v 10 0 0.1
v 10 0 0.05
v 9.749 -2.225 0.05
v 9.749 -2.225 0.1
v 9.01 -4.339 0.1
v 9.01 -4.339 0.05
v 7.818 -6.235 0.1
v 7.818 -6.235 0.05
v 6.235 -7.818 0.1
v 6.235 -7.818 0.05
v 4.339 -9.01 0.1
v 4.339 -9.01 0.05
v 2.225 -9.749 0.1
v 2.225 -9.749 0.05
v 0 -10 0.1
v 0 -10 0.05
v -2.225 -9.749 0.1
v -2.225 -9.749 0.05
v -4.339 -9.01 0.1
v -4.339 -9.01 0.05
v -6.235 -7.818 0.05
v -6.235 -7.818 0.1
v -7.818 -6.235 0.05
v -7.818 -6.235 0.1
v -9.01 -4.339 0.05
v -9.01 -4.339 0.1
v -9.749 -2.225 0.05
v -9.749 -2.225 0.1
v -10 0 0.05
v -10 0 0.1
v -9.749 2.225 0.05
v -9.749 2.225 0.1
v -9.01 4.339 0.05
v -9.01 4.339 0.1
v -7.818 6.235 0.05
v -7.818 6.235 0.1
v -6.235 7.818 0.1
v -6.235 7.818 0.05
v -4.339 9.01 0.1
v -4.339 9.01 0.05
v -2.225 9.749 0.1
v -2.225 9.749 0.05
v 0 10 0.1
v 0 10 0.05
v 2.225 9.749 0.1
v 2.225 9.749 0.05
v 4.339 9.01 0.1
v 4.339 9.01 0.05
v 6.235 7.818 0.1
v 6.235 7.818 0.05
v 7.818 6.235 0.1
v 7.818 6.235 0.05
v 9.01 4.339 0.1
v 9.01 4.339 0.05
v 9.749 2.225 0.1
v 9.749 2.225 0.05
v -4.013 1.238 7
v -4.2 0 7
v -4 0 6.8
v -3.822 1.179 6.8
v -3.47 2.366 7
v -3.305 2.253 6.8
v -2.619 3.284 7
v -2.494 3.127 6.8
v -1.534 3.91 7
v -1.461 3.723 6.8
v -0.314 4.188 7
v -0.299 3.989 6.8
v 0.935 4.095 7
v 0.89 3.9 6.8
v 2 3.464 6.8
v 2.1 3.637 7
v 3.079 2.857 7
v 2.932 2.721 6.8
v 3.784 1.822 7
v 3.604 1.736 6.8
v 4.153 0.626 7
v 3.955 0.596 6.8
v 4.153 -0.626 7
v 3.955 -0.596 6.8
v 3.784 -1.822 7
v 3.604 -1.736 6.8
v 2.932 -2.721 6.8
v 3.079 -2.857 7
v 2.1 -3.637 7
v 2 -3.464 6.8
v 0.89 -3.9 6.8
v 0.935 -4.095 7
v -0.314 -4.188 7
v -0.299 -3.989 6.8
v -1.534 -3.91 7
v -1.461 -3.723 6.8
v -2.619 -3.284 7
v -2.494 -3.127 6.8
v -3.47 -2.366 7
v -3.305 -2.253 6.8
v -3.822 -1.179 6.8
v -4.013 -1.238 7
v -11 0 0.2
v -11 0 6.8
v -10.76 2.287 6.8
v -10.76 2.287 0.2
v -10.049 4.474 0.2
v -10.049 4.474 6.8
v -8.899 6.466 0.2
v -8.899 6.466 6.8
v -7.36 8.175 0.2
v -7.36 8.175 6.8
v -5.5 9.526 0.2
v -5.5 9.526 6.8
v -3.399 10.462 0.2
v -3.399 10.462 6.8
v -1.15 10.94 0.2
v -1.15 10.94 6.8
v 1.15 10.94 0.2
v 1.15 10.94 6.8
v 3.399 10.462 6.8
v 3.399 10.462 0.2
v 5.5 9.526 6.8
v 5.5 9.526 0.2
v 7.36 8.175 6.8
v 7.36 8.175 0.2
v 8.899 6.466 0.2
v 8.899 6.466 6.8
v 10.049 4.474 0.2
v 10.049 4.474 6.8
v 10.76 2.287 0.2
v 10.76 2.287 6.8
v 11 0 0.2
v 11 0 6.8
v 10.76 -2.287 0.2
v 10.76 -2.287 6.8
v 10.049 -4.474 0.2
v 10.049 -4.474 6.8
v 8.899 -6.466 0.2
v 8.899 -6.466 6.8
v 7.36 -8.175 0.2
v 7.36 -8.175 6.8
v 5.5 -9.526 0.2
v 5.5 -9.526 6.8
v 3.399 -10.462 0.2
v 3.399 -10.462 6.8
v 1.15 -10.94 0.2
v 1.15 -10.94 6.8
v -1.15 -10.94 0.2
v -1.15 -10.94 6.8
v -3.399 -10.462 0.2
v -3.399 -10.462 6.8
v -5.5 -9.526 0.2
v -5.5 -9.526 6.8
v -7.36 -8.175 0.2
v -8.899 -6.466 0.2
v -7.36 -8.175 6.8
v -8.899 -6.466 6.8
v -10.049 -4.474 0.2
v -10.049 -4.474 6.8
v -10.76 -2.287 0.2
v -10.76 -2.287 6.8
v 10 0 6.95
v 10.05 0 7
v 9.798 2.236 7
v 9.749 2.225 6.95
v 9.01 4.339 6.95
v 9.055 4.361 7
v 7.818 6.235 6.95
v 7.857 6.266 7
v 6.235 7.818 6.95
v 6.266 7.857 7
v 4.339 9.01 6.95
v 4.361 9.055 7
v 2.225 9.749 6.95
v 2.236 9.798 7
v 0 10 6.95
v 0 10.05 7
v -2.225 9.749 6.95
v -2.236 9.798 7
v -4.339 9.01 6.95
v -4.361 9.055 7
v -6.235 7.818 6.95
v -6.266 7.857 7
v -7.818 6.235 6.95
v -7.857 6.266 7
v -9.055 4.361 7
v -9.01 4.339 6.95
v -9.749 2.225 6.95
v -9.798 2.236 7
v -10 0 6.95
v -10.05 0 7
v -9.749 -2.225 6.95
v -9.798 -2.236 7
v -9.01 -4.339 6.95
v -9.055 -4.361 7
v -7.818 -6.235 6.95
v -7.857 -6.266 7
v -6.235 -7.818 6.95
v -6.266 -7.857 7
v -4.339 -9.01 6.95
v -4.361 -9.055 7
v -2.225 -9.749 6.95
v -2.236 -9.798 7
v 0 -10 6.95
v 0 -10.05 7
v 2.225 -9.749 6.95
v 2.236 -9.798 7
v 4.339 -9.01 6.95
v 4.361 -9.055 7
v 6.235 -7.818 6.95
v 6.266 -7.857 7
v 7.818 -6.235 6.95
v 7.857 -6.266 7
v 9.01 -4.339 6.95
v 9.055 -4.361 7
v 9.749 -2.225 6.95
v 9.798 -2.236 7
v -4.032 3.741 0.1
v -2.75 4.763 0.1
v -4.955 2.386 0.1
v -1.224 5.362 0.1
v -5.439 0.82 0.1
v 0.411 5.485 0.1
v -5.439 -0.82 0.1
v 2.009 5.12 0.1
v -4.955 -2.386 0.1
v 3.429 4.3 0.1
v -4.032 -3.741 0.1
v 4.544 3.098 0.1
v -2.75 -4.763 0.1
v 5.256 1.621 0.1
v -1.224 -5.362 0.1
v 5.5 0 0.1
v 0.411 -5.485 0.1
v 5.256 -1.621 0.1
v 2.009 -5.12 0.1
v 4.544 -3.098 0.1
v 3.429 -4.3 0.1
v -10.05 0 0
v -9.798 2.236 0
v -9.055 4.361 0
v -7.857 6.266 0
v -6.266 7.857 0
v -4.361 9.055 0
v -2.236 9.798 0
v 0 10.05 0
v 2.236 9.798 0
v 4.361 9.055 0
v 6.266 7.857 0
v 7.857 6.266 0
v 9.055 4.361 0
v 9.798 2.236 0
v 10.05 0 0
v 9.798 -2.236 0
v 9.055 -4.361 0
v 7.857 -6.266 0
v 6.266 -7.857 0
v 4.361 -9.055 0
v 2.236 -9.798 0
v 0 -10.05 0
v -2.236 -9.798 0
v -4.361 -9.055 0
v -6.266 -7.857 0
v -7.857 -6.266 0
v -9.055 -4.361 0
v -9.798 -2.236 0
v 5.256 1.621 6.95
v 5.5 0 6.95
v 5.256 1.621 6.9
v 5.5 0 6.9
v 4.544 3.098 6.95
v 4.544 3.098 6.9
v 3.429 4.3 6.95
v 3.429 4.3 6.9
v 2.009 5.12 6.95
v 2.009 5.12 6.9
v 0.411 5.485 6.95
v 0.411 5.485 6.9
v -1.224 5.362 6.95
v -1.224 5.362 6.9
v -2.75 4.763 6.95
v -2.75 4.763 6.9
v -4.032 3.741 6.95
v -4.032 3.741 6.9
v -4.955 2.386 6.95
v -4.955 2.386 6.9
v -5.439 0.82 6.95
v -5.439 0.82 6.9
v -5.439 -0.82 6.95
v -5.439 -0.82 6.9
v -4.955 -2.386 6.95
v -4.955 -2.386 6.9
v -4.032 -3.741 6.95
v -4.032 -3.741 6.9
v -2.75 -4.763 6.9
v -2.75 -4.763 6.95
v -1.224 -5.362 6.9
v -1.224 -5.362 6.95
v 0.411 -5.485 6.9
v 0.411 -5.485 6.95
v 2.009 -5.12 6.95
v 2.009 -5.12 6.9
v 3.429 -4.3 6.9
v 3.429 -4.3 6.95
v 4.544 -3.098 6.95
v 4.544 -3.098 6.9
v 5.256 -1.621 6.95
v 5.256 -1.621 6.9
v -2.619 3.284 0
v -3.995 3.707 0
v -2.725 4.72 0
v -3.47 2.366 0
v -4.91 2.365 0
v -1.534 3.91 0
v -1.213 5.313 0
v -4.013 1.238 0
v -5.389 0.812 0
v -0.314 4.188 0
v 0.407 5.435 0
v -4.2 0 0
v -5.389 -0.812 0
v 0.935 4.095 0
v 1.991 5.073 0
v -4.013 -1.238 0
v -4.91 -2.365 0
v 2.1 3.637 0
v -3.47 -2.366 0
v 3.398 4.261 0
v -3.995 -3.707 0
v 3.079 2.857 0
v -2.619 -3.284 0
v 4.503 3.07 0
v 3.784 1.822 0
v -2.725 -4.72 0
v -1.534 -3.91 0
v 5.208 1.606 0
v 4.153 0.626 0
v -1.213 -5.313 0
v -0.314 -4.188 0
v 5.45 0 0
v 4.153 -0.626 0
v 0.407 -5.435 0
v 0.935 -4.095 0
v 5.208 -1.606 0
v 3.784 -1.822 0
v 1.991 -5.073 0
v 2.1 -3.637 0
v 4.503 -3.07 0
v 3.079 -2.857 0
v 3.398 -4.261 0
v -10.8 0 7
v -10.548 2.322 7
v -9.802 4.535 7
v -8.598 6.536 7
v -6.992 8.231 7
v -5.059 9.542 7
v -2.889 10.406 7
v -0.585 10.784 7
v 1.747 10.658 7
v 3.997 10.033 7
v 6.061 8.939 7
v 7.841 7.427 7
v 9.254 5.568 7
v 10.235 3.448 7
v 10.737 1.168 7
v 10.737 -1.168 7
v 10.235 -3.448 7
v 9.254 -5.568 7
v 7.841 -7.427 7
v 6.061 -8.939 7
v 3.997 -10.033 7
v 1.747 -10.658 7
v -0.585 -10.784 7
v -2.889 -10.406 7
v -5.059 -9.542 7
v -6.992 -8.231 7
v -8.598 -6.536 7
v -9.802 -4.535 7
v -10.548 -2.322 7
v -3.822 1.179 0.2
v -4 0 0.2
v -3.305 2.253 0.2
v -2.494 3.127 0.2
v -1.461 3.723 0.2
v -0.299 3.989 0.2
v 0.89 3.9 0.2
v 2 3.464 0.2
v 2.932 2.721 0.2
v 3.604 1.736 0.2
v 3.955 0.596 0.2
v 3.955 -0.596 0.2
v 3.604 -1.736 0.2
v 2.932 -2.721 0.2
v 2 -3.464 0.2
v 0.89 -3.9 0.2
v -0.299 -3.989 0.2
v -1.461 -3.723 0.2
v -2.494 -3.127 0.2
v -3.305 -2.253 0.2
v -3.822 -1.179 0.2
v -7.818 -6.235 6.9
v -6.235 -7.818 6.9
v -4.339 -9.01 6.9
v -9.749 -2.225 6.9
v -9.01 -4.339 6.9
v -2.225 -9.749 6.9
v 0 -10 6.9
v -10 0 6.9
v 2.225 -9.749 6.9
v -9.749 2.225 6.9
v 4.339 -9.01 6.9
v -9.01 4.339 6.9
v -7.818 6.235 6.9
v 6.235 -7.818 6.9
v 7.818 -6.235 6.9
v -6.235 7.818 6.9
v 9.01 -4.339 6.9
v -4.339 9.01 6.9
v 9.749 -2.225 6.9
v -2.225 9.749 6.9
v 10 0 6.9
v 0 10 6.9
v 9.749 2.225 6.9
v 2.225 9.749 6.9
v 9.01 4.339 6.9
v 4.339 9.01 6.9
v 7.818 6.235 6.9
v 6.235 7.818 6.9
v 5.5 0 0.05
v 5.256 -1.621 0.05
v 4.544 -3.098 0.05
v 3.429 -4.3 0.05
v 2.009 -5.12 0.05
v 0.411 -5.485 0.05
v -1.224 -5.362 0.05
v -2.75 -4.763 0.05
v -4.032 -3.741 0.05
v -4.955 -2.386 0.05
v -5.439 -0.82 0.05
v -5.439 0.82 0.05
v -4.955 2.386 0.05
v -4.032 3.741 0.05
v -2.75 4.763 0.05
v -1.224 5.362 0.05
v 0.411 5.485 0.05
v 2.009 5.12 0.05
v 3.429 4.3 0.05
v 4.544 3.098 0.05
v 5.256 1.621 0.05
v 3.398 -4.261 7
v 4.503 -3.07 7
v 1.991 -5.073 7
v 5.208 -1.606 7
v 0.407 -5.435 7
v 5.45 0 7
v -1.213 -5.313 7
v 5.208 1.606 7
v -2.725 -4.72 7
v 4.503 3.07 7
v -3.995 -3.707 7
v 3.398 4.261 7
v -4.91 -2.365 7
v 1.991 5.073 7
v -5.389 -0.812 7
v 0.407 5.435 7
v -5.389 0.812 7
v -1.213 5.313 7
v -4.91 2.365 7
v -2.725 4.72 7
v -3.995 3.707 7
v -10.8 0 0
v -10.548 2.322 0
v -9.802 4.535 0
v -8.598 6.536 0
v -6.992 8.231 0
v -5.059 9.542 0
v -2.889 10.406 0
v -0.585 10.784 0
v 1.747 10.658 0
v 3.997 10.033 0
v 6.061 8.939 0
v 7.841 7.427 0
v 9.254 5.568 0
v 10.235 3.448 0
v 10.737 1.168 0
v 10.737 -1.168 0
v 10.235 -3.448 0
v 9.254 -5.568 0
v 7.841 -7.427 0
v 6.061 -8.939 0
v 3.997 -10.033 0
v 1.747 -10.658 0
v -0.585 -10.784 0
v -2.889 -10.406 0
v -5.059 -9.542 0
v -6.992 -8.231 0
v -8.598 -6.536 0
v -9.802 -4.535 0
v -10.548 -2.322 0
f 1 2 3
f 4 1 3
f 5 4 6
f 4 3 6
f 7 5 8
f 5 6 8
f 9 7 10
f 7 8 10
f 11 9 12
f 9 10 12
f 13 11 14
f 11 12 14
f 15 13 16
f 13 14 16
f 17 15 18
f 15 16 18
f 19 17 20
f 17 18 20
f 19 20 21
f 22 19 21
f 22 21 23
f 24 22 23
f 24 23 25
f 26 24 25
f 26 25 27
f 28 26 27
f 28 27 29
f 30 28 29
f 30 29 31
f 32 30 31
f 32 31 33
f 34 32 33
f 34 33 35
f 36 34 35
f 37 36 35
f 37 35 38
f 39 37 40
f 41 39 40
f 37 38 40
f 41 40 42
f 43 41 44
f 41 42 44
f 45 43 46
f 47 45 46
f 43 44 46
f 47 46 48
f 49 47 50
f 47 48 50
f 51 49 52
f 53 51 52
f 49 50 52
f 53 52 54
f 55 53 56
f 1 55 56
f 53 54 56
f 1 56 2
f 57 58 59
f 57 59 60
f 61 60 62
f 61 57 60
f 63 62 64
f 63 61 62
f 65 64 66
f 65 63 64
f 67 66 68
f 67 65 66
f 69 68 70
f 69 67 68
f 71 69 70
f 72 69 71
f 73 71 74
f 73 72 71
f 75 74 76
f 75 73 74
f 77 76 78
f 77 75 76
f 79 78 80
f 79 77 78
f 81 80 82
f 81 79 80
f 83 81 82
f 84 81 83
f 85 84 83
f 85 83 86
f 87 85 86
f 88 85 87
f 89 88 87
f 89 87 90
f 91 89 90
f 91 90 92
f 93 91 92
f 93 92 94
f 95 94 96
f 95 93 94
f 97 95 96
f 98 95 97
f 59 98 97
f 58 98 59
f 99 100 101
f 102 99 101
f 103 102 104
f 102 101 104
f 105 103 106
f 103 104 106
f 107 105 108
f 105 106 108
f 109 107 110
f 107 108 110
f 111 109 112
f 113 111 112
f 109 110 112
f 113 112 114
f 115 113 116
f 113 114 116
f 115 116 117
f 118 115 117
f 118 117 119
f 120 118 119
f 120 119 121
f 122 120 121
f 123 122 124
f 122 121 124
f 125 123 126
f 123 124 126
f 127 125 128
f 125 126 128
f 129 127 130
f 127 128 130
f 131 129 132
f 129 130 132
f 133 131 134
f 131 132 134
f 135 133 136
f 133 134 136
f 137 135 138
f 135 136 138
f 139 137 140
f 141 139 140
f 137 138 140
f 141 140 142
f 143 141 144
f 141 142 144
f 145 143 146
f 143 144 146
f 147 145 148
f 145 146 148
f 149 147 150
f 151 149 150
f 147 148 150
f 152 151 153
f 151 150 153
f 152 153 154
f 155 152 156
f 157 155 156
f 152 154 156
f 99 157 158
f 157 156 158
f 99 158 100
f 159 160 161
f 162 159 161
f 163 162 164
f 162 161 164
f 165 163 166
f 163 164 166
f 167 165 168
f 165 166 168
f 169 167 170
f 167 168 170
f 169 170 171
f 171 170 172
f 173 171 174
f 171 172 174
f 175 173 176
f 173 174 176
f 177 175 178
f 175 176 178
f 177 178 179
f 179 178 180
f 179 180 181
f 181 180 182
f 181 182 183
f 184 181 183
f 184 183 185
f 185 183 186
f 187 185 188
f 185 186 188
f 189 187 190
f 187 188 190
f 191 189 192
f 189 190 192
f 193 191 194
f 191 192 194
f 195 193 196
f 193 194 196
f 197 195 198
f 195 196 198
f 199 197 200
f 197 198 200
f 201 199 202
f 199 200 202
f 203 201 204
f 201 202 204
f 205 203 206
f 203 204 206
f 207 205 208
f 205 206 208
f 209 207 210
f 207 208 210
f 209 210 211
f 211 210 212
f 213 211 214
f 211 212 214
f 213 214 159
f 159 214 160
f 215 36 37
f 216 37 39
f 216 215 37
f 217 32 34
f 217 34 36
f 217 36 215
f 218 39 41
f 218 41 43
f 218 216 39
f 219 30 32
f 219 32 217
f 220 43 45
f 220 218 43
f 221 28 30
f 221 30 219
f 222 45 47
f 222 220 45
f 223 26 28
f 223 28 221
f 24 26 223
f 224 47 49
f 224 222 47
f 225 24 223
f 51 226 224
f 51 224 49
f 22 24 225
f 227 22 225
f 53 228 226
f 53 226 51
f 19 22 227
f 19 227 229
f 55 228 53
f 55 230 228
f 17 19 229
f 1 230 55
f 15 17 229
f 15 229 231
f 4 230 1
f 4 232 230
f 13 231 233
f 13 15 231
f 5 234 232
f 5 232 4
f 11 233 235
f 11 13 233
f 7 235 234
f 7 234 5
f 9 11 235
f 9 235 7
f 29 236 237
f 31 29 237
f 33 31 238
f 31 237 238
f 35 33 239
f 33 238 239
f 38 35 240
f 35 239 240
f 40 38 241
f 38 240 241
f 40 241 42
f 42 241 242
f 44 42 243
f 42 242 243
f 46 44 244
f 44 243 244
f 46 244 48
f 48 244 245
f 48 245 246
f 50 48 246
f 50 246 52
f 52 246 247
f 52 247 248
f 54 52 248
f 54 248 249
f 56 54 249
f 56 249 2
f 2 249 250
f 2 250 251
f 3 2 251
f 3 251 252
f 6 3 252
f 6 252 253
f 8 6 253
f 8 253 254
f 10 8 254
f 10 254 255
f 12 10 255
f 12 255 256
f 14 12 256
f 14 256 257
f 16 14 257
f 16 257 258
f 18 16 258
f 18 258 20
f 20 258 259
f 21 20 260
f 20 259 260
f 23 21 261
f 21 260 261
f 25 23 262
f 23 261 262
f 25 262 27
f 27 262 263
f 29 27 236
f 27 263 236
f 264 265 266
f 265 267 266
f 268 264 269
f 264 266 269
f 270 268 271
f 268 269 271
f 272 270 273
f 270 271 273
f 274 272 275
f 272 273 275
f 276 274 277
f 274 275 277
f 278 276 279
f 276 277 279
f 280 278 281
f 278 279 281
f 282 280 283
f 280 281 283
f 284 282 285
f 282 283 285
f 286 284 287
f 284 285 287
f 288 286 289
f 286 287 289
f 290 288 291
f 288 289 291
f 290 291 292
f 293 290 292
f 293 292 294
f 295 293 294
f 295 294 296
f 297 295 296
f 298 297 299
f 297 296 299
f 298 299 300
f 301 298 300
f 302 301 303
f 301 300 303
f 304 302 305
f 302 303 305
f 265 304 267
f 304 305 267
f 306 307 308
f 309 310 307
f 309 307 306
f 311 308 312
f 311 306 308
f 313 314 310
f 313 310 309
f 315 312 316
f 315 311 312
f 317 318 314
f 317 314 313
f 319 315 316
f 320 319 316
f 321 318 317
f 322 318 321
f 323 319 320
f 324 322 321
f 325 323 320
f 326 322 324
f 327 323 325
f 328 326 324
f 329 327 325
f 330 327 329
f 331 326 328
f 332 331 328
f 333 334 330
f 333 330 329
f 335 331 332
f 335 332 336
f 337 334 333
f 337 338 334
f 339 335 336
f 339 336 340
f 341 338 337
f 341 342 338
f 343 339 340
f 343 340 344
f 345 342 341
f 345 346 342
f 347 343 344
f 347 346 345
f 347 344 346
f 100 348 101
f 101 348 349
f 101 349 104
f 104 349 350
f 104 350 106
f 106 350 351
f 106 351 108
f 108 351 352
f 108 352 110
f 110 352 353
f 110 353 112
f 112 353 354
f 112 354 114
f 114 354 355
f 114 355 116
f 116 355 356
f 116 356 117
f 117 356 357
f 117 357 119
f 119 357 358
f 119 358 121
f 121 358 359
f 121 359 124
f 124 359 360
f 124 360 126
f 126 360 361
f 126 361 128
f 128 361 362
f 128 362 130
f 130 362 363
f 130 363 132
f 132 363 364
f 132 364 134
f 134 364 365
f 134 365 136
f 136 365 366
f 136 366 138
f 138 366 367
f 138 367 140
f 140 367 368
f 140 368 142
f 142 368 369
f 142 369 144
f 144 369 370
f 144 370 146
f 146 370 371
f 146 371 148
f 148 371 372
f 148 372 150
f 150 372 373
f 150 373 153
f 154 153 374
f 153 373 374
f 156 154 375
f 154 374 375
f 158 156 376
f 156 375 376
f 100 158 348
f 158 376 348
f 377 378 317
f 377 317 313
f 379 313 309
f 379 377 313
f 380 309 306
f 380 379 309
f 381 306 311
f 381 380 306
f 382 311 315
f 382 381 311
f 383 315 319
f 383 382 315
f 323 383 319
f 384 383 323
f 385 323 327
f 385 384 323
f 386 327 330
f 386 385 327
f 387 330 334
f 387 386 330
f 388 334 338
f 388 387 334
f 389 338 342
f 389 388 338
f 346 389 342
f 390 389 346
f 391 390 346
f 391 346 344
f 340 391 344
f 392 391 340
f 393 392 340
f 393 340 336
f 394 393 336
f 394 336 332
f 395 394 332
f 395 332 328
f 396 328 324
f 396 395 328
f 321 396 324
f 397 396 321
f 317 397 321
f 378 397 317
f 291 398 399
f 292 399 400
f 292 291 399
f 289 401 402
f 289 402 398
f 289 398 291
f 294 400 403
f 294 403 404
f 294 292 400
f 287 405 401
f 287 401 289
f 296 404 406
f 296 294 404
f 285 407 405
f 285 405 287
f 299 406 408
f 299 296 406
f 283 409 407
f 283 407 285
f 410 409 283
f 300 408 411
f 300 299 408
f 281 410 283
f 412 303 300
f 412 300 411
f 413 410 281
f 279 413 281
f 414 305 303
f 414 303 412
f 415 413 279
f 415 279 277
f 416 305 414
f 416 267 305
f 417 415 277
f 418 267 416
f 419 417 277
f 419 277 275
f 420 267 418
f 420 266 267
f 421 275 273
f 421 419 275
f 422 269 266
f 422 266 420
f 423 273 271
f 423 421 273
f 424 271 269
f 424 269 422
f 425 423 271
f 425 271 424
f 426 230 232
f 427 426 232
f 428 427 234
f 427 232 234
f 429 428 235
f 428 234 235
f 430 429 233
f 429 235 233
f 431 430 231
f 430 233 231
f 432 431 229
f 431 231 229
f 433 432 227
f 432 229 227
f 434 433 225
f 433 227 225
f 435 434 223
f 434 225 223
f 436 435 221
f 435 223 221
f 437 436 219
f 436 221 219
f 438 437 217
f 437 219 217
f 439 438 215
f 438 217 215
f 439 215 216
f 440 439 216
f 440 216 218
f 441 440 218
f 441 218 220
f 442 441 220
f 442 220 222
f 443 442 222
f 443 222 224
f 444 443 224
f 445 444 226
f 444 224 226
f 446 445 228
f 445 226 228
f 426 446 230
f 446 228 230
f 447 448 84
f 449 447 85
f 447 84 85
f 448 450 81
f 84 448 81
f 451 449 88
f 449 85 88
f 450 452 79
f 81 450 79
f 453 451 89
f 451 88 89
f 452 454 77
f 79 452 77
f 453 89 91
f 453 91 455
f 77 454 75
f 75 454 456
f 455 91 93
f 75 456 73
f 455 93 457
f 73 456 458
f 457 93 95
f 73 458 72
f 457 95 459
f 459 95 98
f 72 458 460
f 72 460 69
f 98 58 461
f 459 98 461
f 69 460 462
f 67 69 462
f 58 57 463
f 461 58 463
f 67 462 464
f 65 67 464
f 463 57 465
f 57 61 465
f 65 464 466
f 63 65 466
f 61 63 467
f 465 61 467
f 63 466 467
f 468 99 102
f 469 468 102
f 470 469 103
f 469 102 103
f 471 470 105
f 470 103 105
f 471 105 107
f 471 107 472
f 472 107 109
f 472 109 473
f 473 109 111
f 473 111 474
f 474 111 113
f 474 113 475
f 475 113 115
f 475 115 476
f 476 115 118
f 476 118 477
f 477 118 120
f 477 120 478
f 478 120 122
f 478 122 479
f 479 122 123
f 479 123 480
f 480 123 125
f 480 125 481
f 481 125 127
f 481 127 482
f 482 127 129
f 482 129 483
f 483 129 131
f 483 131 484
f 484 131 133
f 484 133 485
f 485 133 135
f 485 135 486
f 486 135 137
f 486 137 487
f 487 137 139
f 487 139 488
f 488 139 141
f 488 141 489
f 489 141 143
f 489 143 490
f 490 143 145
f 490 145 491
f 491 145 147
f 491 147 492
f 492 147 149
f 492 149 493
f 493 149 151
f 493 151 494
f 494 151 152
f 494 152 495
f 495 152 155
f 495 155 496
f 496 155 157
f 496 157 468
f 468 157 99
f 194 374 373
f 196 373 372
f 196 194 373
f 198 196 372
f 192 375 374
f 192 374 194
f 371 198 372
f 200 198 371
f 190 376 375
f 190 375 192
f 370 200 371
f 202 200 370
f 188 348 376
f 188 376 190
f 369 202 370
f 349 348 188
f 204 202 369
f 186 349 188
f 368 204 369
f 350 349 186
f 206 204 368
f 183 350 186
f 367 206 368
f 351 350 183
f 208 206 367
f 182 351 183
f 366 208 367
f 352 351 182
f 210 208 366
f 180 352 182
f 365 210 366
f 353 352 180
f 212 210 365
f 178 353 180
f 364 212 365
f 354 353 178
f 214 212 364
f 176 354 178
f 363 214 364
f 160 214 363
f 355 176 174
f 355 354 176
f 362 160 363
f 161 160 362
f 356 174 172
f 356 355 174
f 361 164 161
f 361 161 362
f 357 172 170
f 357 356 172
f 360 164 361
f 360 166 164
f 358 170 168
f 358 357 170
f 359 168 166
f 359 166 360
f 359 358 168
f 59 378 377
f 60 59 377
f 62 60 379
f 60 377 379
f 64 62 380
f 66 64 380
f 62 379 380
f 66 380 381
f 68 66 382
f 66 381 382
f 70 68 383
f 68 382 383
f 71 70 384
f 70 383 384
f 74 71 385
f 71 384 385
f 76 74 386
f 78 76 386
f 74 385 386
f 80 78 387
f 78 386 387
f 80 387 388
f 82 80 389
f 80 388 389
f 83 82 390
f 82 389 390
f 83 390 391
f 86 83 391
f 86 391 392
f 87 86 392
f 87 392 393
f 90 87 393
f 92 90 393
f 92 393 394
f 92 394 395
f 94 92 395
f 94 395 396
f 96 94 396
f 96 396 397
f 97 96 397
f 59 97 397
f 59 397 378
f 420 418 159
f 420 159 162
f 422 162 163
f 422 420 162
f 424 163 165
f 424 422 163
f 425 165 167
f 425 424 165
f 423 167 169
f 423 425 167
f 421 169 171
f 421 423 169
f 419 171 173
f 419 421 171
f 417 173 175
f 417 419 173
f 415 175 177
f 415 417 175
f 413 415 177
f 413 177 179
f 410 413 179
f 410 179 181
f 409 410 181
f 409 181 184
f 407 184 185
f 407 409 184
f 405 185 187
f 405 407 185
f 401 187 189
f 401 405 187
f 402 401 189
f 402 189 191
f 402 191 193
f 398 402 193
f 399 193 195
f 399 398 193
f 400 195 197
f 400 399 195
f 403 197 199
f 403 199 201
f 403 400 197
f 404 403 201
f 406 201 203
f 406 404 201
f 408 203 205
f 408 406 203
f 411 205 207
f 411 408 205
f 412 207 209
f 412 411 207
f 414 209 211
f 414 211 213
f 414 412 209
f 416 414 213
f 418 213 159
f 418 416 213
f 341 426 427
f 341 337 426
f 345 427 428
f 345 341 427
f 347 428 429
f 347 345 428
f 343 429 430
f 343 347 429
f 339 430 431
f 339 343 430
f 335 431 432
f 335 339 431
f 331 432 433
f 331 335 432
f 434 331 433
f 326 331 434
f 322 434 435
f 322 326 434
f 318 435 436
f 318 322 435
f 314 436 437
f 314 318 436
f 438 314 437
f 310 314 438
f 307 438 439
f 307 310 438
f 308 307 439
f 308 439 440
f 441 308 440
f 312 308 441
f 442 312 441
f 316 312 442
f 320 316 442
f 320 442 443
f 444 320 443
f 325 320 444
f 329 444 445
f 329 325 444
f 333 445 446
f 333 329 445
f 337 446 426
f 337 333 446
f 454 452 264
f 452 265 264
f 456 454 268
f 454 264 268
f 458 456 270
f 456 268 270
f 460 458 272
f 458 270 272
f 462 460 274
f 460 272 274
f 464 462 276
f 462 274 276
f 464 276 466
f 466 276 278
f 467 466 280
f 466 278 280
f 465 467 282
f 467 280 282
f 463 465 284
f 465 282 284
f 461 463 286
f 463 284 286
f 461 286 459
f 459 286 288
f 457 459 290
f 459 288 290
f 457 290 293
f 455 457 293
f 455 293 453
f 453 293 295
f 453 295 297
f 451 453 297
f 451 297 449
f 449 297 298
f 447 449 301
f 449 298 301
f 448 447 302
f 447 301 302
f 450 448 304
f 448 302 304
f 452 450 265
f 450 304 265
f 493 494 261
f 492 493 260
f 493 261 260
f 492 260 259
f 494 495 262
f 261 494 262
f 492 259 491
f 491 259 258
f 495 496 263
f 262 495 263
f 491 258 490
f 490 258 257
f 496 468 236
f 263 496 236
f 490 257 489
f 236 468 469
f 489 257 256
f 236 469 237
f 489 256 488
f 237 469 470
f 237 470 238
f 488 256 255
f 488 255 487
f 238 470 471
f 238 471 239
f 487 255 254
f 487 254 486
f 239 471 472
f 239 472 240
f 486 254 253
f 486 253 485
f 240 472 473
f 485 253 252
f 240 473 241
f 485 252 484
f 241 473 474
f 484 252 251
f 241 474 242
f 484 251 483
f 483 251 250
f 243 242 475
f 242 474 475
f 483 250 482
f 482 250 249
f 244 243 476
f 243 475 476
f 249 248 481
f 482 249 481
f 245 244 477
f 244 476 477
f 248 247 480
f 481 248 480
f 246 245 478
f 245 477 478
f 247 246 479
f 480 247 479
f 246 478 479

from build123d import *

# Parameters (mm, degrees)
SKETCH1_W                = 11
SKETCH1_H                = 7
SKETCH2_R                = 10.05
CUT_EXTRUDE1_DEPTH       = 0.05
CUT_EXTRUDE1_DRAFT       = -45
SKETCH3_R                = 10
CUT_EXTRUDE2_DEPTH       = 0.05
SKETCH4_R                = 5.5
BOSS_EXTRUDE1_DEPTH      = 0.05
SKETCH5_R                = 5.5
BOSS_EXTRUDE2_DEPTH      = 0.05
BOSS_EXTRUDE2_TAPER      = 45
SKETCH6_R                = 10.05
CUT_EXTRUDE3_DEPTH       = 0.05
CUT_EXTRUDE3_DRAFT       = -45
CUT_EXTRUDE4_START       = -0.05
SKETCH7_R                = 10
CUT_EXTRUDE4_DEPTH       = 0.05
F_8_0_8_DIAMETER_HOLE1_D = 8
CHAMFER1_SIZE            = 0.2


with BuildPart() as part:
    # Sketch1 → Revolve1 (revolve)
    with BuildSketch(Plane.XZ, mode=Mode.PRIVATE) as revolve1_sk:
        with Locations((5.5, 3.5)):
            Rectangle(SKETCH1_W, SKETCH1_H)
    revolve(revolve1_sk.sketch.rotate(Axis((0, 0, 7), (0, 0, -1)), 180), axis=Axis((0, 0, 7), (0, 0, -1)))


with BuildPart() as cut_extrude1_tool:
    # Sketch2 → Cut-Extrude1 (with draft: the straight prism first)
    with BuildSketch(Plane(origin=(0, 0, 0), x_dir=(-1, 0, 0), z_dir=(0, 0, -1))):
        Circle(SKETCH2_R)
    extrude(amount=-CUT_EXTRUDE1_DEPTH)
    # Cut-Extrude1: the draft: its side faces are tilted about the plane it starts from
    cut_extrude1_sides = [cut_extrude1_tool.faces().sort_by_distance(p)[0] for p in [
        (10.05, 0, 0.025),
    ]]
    draft(cut_extrude1_sides, Plane(origin=(0, 0, 0), x_dir=(-1, 0, 0), z_dir=(0, 0, -1)), CUT_EXTRUDE1_DRAFT)


with BuildPart() as part_1:
    add(part.part)

    # Cut-Extrude1: cut by cut_extrude1_tool
    add(cut_extrude1_tool.part, mode=Mode.SUBTRACT)

    # Sketch3 → Cut-Extrude2 (cut)
    with BuildSketch(Plane(origin=(0, 0, 0.05), x_dir=(-1, 0, 0), z_dir=(0, 0, -1))):
        with Locations(Location((0, 0, 0), (0, 0, 180))):
            Circle(SKETCH3_R)
    extrude(amount=-CUT_EXTRUDE2_DEPTH, mode=Mode.SUBTRACT)

    # Sketch4 → Boss-Extrude1 (add)
    with BuildSketch(Plane(origin=(0, 0, 0.1), x_dir=(-1, 0, 0), z_dir=(0, 0, -1))):
        with Locations(Location((0, 0, 0), (0, 0, 180))):
            Circle(SKETCH4_R)
    extrude(amount=BOSS_EXTRUDE1_DEPTH)

    # Sketch5 → Boss-Extrude2 (add)
    with BuildSketch(Plane(origin=(0, 0, 0.05), x_dir=(-1, 0, 0), z_dir=(0, 0, -1))):
        with Locations(Location((0, 0, 0), (0, 0, 180))):
            Circle(SKETCH5_R)
    extrude(amount=BOSS_EXTRUDE2_DEPTH, taper=BOSS_EXTRUDE2_TAPER)


with BuildPart() as cut_extrude3_tool:
    # Sketch6 → Cut-Extrude3 (with draft: the straight prism first)
    with BuildSketch(Plane.XY.offset(7)):
        Circle(SKETCH6_R)
    extrude(amount=-CUT_EXTRUDE3_DEPTH)
    # Cut-Extrude3: the draft: its side faces are tilted about the plane it starts from
    cut_extrude3_sides = [cut_extrude3_tool.faces().sort_by_distance(p)[0] for p in [
        (-10.05, 0, 6.975),
    ]]
    draft(cut_extrude3_sides, Plane.XY.offset(7), CUT_EXTRUDE3_DRAFT)


with BuildPart() as part_2:
    add(part_1.part)

    # Cut-Extrude3: cut by cut_extrude3_tool
    add(cut_extrude3_tool.part, mode=Mode.SUBTRACT)

    # Sketch7 → Cut-Extrude4 (cut)
    with BuildSketch(Plane.XY.offset(6.95).offset(CUT_EXTRUDE4_START)):
        Circle(SKETCH7_R)
    extrude(amount=CUT_EXTRUDE4_DEPTH, mode=Mode.SUBTRACT)

    # Sketch8 → Revolve2 (revolve)
    with BuildSketch(Plane(origin=(0, 0, 0), x_dir=(1, 0, 0), z_dir=(0, 1, 0))):
        Polygon((5.5, -6.9), (0, -6.9), (0, -7), (5.45, -7), (5.5, -6.95), align=None)
    revolve(axis=Axis((0, 0, 6.9), (0, 0, 1)))

    # Ø8.0 (8) Diameter Hole1 (through all)
    with Locations(Plane.XY.offset(7)):
        with Locations((0, 0)):
            Hole(F_8_0_8_DIAMETER_HOLE1_D / 2)

    # Chamfer1
    chamfer1_edges = [part_2.edges().sort_by_distance(p)[0] for p in [
        (11, 0, 0),
        (4, 0, 7),
        (4, 0, 0),
        (11, 0, 7),
    ]]
    chamfer(chamfer1_edges, length=CHAMFER1_SIZE)


solid = part_2.part
